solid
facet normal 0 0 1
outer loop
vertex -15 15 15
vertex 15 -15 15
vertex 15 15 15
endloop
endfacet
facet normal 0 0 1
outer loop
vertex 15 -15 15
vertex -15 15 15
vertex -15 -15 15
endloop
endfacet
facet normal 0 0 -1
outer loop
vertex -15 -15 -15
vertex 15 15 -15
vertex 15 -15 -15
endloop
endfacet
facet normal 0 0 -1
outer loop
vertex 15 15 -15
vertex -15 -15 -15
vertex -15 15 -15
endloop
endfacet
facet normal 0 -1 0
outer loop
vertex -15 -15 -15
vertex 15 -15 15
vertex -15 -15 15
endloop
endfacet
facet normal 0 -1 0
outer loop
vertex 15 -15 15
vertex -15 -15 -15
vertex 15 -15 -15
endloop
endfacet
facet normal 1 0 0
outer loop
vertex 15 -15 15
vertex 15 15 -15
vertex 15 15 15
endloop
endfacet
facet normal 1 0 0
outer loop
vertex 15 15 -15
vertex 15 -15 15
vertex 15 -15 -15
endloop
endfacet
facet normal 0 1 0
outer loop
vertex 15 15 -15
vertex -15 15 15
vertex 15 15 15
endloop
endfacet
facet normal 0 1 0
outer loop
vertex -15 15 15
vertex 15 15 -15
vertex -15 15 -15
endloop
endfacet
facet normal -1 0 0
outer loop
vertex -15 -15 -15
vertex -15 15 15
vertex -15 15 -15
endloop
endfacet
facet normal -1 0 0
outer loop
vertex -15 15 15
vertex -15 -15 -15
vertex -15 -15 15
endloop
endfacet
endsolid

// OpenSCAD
// $preview is true while the model is displayed (OpenSCAD's F5) and false when
// it is exported (F6). NopSCADlib's test files gate all their geometry on it.

if ($preview)
    cube(10, center = true);
else
    cube(30, center = true);
